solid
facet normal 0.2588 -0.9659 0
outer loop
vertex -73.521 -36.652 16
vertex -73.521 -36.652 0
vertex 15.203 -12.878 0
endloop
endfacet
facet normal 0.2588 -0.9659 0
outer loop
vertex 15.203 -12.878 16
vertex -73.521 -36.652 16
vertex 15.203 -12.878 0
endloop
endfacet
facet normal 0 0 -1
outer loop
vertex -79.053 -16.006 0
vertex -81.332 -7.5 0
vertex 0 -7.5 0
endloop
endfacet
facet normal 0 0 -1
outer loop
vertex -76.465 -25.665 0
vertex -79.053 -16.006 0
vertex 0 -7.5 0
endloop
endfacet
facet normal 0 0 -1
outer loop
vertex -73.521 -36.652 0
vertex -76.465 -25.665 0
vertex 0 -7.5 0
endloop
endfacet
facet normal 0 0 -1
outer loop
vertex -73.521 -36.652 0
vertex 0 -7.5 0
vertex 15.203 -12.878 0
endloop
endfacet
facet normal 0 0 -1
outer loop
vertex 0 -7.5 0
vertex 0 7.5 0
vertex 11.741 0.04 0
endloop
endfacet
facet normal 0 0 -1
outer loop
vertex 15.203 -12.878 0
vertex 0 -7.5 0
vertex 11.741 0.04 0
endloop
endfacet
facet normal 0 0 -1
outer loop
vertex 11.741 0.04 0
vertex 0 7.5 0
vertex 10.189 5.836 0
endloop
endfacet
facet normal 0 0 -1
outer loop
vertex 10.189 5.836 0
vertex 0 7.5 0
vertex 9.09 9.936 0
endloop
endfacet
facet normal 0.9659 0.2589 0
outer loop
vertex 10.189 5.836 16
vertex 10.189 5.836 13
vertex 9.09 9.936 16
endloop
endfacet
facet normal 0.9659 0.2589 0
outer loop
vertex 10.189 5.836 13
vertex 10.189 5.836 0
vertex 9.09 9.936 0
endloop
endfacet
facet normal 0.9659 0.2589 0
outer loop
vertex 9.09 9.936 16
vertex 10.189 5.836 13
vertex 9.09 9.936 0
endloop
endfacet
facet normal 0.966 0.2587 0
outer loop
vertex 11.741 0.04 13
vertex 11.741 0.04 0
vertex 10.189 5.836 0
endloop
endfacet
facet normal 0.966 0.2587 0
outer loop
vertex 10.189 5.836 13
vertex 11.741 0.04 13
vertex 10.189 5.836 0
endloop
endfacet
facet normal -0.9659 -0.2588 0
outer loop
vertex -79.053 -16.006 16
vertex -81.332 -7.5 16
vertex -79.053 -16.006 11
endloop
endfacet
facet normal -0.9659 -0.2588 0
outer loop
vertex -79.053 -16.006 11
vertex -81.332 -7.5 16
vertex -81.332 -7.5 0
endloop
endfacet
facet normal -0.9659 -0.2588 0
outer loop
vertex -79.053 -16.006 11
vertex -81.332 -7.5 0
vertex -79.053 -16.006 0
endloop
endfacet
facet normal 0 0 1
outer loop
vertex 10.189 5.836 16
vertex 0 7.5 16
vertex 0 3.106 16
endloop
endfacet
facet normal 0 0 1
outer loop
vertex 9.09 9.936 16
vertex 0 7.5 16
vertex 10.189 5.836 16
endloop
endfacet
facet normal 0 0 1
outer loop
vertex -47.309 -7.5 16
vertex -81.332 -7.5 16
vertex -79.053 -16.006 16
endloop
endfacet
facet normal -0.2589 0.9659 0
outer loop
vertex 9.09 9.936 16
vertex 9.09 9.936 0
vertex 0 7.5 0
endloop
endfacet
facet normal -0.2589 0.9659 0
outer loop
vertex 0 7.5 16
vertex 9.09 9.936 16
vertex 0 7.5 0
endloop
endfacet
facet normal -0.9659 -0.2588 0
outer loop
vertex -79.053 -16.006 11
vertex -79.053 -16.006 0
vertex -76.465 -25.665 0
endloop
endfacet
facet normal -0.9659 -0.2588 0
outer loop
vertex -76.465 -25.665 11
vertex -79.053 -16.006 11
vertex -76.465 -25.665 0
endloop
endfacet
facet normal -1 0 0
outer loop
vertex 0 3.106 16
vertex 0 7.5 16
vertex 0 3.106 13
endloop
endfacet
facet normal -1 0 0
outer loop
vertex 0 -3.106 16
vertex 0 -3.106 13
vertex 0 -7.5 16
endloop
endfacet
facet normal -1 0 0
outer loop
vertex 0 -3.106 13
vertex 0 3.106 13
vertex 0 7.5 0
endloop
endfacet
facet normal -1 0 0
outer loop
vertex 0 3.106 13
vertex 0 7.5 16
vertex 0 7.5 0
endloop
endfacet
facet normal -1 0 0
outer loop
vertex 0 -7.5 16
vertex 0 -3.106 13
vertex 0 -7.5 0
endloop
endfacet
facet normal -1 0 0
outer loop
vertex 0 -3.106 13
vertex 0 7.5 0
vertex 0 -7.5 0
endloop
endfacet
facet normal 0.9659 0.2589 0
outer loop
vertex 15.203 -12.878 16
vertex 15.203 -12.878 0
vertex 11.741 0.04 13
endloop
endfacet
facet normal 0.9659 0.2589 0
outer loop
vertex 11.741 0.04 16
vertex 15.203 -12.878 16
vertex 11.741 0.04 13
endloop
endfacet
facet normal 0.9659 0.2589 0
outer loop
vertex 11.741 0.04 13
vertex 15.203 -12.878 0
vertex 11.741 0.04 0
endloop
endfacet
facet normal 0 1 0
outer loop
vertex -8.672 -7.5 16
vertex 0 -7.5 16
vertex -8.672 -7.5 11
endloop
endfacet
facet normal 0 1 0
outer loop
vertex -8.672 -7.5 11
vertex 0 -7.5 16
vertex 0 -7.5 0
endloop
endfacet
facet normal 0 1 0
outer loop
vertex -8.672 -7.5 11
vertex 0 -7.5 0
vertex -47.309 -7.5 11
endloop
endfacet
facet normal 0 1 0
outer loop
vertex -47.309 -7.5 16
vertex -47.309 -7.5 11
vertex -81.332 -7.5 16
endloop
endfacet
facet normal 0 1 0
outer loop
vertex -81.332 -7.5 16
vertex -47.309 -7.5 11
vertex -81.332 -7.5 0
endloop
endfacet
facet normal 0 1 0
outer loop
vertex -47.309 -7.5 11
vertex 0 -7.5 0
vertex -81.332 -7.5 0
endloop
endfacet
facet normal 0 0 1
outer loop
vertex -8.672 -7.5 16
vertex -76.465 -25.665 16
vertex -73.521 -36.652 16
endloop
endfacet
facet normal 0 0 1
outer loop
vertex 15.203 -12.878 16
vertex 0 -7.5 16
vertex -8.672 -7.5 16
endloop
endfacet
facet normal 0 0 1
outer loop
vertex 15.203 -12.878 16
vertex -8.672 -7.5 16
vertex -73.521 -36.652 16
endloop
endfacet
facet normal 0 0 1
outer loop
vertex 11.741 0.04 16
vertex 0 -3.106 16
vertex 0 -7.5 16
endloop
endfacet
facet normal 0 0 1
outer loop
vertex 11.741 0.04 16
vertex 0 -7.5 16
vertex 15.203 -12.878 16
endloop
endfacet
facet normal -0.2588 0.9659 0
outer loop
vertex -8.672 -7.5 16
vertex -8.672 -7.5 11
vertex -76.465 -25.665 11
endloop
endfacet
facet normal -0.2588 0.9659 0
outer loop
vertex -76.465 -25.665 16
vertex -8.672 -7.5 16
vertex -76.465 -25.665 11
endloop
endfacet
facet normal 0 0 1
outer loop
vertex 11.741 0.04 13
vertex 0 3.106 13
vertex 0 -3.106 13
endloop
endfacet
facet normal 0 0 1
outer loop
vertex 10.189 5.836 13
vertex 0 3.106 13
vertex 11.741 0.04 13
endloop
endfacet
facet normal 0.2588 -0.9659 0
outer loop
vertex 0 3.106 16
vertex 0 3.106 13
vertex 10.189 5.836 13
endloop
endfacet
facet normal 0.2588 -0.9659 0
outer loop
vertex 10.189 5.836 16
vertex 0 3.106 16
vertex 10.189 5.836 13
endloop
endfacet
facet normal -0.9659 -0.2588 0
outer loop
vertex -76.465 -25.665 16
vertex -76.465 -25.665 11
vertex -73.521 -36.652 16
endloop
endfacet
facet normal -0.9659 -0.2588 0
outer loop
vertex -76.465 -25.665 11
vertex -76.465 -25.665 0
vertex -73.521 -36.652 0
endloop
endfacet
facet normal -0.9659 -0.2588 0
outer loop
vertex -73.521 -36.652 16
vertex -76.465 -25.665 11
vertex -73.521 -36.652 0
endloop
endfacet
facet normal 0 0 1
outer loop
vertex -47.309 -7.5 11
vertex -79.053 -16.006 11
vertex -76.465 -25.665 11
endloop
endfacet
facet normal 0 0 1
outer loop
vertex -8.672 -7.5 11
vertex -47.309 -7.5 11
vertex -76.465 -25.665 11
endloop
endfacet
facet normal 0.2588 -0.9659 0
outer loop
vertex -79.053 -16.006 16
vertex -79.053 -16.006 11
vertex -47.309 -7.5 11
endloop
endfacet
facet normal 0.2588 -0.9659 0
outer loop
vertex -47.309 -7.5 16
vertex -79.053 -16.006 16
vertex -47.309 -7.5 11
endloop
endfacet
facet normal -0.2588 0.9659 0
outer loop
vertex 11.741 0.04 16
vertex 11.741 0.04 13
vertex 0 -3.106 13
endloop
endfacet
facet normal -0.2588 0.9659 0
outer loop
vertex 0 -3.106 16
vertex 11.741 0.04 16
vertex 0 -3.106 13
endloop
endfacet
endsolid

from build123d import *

# Parameters (mm, degrees)
F4_DEPTH = 16
F5_DEPTH = 11
F6_DEPTH = 13


with BuildPart() as f4:
    # F2 (on Top) → F4 (new body)
    with BuildSketch(Plane.XY):
        Polygon((11.7414596618, 0.0402860931), (0, -3.1058285412), (0, -7.5), (-8.671864531, -7.5), (-76.4647760054, -25.6650558821), (-73.5208917648, -36.6517814396), (15.2029819926, -12.8782911169), align=None)
    extrude(amount=F4_DEPTH)



with BuildPart() as f4b:
    # F2 (on Top) → F4, piece 2 (new body)
    with BuildSketch(Plane.XY):
        Polygon((-79.0529664564, -16.0057976192), (-47.3088975825, -7.5), (-81.3320880594, -7.5), align=None)
    extrude(amount=F4_DEPTH)


with BuildPart() as f4c:
    # F2 (on Top) → F4, piece 3 (new body)
    with BuildSketch(Plane.XY):
        Polygon((0, 7.5), (0, 3.1058285412), (10.1885453912, 5.8358410508), (9.0900025265, 9.9356588362), align=None)
    extrude(amount=F4_DEPTH)


with BuildPart() as f4_1:
    add(f4.part)

    add(f4b.part)  # F5 merges F4b
    # F2 (on Top) → F5 (join)
    with BuildSketch(Plane.XY):
        Polygon((-76.4647760054, -25.6650558821), (-8.671864531, -7.5), (-47.3088975825, -7.5), (-79.0529664564, -16.0057976192), align=None)
    extrude(amount=F5_DEPTH)


    add(f4c.part)  # F6 merges F4c
    # F2 (on Top) → F6 (join)
    with BuildSketch(Plane.XY):
        Polygon((0, 3.1058285412), (0, 0), (0, -3.1058285412), (11.7414596618, 0.0402860931), (10.1885453912, 5.8358410508), align=None)
    extrude(amount=F6_DEPTH)


solid = f4_1.part
